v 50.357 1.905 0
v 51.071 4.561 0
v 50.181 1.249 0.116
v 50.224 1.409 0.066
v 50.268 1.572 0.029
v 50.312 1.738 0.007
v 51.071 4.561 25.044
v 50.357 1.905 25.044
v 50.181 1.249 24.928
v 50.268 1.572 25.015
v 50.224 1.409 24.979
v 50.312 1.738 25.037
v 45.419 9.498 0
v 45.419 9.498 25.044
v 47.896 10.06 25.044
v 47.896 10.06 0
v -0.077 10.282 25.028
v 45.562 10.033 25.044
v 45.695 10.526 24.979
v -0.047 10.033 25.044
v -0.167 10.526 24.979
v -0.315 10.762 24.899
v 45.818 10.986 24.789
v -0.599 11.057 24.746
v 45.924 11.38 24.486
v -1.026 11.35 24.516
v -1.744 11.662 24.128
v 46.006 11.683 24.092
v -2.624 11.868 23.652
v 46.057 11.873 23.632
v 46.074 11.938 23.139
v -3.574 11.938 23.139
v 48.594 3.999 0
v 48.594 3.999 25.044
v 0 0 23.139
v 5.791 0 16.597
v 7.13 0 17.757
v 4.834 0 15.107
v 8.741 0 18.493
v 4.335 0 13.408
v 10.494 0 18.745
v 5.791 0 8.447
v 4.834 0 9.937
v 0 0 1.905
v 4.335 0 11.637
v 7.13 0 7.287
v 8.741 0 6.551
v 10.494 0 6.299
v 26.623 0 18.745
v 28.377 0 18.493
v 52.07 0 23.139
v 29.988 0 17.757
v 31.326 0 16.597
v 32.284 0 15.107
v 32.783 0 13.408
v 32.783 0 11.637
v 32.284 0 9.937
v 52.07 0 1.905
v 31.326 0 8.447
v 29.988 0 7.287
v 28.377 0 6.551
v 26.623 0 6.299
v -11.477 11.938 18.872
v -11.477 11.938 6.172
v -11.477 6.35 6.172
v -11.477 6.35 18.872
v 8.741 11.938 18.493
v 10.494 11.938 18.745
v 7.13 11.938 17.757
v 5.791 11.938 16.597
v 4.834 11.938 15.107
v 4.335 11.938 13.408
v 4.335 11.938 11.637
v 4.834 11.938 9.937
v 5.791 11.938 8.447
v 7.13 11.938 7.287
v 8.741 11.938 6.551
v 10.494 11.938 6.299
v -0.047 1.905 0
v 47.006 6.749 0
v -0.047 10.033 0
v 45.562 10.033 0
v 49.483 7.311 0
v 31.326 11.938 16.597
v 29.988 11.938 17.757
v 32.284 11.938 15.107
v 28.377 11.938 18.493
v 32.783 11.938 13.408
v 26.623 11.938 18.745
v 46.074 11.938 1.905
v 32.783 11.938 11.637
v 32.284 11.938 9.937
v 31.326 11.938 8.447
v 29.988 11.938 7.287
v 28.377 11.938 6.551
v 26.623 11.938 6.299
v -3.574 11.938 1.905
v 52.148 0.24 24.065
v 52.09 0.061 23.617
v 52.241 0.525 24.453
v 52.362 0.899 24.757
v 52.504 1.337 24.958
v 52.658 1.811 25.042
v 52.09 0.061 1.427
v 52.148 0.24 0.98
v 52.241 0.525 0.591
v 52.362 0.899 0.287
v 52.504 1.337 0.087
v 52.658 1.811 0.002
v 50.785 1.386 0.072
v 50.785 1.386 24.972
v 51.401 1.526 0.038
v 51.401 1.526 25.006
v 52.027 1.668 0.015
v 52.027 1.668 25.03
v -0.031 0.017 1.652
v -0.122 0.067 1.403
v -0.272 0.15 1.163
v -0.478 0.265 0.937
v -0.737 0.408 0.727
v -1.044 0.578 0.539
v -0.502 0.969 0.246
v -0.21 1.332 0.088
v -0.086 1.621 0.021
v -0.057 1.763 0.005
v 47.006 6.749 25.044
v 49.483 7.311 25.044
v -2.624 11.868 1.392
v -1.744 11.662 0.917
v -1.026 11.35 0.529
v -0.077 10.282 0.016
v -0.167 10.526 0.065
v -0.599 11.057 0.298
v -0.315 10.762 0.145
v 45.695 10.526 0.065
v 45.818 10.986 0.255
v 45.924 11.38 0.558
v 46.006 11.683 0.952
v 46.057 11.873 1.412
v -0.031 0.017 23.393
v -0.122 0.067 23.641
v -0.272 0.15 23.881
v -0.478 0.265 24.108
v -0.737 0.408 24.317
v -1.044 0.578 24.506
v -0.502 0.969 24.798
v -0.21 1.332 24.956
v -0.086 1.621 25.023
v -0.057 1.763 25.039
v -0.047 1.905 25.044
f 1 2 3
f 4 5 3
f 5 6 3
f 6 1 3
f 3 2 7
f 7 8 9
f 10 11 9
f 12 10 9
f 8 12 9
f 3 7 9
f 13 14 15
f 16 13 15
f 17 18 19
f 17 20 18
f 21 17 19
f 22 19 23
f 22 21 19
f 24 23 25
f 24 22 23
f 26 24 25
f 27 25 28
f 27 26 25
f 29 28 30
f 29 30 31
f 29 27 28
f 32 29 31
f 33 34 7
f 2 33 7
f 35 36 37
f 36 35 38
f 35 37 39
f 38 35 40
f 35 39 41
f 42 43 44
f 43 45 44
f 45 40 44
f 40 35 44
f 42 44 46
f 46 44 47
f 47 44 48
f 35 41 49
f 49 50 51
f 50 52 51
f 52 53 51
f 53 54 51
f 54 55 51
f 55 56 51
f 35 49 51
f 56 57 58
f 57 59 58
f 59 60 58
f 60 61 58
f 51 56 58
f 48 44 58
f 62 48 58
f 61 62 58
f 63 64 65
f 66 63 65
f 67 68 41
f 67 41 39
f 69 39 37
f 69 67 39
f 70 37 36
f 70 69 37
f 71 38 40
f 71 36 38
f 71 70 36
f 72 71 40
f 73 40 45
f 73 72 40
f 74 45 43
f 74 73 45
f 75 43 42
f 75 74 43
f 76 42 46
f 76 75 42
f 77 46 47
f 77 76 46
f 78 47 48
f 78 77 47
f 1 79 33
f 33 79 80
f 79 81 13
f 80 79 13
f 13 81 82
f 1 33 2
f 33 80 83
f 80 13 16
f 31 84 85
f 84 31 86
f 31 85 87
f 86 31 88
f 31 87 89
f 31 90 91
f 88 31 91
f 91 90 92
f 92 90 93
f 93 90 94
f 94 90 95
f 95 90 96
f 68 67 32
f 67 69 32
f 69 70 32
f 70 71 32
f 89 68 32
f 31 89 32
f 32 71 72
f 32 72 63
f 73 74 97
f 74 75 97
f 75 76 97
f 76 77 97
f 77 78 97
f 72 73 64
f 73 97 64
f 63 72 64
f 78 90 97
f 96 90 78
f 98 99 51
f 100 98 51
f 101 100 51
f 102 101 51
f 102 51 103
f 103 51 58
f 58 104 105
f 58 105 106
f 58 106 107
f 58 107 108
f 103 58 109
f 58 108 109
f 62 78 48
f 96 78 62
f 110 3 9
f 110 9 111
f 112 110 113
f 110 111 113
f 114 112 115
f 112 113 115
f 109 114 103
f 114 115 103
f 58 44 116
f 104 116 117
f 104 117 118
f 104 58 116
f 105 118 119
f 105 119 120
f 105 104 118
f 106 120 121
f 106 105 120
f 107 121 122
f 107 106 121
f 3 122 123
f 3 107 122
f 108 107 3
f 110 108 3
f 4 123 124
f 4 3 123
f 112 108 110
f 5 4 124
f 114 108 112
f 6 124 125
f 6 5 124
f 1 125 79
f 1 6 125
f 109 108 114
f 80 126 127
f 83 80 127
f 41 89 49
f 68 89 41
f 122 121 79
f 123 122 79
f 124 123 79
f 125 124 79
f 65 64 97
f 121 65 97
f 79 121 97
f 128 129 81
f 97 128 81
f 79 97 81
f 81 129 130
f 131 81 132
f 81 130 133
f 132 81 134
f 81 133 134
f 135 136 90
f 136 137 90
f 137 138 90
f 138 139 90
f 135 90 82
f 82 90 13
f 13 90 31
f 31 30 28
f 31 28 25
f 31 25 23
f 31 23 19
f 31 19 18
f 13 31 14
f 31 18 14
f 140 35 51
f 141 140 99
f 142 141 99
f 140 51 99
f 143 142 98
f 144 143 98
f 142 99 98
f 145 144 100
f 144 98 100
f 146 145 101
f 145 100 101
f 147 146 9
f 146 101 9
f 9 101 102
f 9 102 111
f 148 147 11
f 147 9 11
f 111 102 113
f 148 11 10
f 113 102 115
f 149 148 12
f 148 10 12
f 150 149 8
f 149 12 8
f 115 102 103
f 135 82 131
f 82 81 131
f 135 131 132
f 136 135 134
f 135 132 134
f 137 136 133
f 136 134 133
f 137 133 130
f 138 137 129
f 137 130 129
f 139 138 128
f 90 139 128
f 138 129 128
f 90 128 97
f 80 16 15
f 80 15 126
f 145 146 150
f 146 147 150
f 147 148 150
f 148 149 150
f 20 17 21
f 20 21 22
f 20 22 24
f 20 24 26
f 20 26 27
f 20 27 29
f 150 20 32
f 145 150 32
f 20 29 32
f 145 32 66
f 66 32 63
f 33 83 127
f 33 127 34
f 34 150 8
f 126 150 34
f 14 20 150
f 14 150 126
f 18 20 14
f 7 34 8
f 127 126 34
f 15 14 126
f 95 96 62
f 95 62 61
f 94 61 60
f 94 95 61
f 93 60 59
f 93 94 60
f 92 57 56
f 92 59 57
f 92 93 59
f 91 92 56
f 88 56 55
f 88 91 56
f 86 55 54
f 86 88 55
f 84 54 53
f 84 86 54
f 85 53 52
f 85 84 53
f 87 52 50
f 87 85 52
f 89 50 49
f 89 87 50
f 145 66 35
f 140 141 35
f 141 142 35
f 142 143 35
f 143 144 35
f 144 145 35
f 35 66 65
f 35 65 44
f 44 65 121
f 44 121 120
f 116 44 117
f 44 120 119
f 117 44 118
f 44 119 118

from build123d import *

# Parameters (mm, degrees)
BOSS_EXTRUDE1_DEPTH = 25.0444
CUT_EXTRUDE1_DEPTH  = 60.520050184
LPATTERN1_COUNT     = 11
LPATTERN1_PITCH     = 3.175
CUT_EXTRUDE2_DEPTH  = 60.520050184
FILLET1_R           = 1.905


with BuildPart() as part:
    # Sketch1 → Boss-Extrude1 (new body)
    with BuildSketch(Plane.XY):
        Polygon((0, 0), (52.07, 0), (52.658318987, 1.811473978), (46.811766462, 11.938), (-11.476681013, 11.938), (-11.476681013, 6.35), align=None)
    extrude(amount=BOSS_EXTRUDE1_DEPTH)

    # Sketch2 → Cut-Extrude1 (cut, through all)
    with BuildSketch(Plane.XY.offset(25.0444)):
        Polygon((51.070818987, 4.561104635), (50.181267753, 1.249497834), (52.658318987, 1.811473978), align=None)
    cut_extrude1 = extrude(amount=-CUT_EXTRUDE1_DEPTH, mode=Mode.SUBTRACT)

    # LPattern1: Cut-Extrude1 ×11
    with Locations(*[Vector(-0.49999999999999795, 0.8660254037844398, 0) * (i * LPATTERN1_PITCH) for i in range(1, LPATTERN1_COUNT)]):
        add(cut_extrude1, mode=Mode.SUBTRACT)

    # Sketch3 → Cut-Extrude2 (cut, through all)
    with BuildSketch(Plane(origin=(0, 11.938, 0), x_dir=(1, 0, 0), z_dir=(0, 1, 0))):
        with BuildLine():
            Line((10.494318987, -6.2992), (26.623318987, -6.2992))
            ThreePointArc((26.623318987, -6.2992), (32.846318987, -12.5222), (26.623318987, -18.7452))
            Line((26.623318987, -18.7452), (10.494318987, -18.7452))
            ThreePointArc((10.494318987, -18.7452), (4.271318987, -12.5222), (10.494318987, -6.2992))
        make_face()
        Polygon((-11.476681013, -6.1722), (-0.046681013, 0), (-11.476681013, 0), align=None)
        Polygon((-11.476681013, -25.0444), (-0.046681013, -25.0444), (-11.476681013, -18.8722), align=None)
    extrude(amount=-CUT_EXTRUDE2_DEPTH, mode=Mode.SUBTRACT)

    # Fillet1
    fillet1_edges = [part.edges().sort_by_distance(p)[0] for p in [
        (23.013702779, 11.938, 25.0444),
        (23.013702779, 11.938, 0),
        (26.035, 0, 0),
        (26.035, 0, 25.0444),
    ]]
    fillet(fillet1_edges, radius=FILLET1_R)


solid = part.part
